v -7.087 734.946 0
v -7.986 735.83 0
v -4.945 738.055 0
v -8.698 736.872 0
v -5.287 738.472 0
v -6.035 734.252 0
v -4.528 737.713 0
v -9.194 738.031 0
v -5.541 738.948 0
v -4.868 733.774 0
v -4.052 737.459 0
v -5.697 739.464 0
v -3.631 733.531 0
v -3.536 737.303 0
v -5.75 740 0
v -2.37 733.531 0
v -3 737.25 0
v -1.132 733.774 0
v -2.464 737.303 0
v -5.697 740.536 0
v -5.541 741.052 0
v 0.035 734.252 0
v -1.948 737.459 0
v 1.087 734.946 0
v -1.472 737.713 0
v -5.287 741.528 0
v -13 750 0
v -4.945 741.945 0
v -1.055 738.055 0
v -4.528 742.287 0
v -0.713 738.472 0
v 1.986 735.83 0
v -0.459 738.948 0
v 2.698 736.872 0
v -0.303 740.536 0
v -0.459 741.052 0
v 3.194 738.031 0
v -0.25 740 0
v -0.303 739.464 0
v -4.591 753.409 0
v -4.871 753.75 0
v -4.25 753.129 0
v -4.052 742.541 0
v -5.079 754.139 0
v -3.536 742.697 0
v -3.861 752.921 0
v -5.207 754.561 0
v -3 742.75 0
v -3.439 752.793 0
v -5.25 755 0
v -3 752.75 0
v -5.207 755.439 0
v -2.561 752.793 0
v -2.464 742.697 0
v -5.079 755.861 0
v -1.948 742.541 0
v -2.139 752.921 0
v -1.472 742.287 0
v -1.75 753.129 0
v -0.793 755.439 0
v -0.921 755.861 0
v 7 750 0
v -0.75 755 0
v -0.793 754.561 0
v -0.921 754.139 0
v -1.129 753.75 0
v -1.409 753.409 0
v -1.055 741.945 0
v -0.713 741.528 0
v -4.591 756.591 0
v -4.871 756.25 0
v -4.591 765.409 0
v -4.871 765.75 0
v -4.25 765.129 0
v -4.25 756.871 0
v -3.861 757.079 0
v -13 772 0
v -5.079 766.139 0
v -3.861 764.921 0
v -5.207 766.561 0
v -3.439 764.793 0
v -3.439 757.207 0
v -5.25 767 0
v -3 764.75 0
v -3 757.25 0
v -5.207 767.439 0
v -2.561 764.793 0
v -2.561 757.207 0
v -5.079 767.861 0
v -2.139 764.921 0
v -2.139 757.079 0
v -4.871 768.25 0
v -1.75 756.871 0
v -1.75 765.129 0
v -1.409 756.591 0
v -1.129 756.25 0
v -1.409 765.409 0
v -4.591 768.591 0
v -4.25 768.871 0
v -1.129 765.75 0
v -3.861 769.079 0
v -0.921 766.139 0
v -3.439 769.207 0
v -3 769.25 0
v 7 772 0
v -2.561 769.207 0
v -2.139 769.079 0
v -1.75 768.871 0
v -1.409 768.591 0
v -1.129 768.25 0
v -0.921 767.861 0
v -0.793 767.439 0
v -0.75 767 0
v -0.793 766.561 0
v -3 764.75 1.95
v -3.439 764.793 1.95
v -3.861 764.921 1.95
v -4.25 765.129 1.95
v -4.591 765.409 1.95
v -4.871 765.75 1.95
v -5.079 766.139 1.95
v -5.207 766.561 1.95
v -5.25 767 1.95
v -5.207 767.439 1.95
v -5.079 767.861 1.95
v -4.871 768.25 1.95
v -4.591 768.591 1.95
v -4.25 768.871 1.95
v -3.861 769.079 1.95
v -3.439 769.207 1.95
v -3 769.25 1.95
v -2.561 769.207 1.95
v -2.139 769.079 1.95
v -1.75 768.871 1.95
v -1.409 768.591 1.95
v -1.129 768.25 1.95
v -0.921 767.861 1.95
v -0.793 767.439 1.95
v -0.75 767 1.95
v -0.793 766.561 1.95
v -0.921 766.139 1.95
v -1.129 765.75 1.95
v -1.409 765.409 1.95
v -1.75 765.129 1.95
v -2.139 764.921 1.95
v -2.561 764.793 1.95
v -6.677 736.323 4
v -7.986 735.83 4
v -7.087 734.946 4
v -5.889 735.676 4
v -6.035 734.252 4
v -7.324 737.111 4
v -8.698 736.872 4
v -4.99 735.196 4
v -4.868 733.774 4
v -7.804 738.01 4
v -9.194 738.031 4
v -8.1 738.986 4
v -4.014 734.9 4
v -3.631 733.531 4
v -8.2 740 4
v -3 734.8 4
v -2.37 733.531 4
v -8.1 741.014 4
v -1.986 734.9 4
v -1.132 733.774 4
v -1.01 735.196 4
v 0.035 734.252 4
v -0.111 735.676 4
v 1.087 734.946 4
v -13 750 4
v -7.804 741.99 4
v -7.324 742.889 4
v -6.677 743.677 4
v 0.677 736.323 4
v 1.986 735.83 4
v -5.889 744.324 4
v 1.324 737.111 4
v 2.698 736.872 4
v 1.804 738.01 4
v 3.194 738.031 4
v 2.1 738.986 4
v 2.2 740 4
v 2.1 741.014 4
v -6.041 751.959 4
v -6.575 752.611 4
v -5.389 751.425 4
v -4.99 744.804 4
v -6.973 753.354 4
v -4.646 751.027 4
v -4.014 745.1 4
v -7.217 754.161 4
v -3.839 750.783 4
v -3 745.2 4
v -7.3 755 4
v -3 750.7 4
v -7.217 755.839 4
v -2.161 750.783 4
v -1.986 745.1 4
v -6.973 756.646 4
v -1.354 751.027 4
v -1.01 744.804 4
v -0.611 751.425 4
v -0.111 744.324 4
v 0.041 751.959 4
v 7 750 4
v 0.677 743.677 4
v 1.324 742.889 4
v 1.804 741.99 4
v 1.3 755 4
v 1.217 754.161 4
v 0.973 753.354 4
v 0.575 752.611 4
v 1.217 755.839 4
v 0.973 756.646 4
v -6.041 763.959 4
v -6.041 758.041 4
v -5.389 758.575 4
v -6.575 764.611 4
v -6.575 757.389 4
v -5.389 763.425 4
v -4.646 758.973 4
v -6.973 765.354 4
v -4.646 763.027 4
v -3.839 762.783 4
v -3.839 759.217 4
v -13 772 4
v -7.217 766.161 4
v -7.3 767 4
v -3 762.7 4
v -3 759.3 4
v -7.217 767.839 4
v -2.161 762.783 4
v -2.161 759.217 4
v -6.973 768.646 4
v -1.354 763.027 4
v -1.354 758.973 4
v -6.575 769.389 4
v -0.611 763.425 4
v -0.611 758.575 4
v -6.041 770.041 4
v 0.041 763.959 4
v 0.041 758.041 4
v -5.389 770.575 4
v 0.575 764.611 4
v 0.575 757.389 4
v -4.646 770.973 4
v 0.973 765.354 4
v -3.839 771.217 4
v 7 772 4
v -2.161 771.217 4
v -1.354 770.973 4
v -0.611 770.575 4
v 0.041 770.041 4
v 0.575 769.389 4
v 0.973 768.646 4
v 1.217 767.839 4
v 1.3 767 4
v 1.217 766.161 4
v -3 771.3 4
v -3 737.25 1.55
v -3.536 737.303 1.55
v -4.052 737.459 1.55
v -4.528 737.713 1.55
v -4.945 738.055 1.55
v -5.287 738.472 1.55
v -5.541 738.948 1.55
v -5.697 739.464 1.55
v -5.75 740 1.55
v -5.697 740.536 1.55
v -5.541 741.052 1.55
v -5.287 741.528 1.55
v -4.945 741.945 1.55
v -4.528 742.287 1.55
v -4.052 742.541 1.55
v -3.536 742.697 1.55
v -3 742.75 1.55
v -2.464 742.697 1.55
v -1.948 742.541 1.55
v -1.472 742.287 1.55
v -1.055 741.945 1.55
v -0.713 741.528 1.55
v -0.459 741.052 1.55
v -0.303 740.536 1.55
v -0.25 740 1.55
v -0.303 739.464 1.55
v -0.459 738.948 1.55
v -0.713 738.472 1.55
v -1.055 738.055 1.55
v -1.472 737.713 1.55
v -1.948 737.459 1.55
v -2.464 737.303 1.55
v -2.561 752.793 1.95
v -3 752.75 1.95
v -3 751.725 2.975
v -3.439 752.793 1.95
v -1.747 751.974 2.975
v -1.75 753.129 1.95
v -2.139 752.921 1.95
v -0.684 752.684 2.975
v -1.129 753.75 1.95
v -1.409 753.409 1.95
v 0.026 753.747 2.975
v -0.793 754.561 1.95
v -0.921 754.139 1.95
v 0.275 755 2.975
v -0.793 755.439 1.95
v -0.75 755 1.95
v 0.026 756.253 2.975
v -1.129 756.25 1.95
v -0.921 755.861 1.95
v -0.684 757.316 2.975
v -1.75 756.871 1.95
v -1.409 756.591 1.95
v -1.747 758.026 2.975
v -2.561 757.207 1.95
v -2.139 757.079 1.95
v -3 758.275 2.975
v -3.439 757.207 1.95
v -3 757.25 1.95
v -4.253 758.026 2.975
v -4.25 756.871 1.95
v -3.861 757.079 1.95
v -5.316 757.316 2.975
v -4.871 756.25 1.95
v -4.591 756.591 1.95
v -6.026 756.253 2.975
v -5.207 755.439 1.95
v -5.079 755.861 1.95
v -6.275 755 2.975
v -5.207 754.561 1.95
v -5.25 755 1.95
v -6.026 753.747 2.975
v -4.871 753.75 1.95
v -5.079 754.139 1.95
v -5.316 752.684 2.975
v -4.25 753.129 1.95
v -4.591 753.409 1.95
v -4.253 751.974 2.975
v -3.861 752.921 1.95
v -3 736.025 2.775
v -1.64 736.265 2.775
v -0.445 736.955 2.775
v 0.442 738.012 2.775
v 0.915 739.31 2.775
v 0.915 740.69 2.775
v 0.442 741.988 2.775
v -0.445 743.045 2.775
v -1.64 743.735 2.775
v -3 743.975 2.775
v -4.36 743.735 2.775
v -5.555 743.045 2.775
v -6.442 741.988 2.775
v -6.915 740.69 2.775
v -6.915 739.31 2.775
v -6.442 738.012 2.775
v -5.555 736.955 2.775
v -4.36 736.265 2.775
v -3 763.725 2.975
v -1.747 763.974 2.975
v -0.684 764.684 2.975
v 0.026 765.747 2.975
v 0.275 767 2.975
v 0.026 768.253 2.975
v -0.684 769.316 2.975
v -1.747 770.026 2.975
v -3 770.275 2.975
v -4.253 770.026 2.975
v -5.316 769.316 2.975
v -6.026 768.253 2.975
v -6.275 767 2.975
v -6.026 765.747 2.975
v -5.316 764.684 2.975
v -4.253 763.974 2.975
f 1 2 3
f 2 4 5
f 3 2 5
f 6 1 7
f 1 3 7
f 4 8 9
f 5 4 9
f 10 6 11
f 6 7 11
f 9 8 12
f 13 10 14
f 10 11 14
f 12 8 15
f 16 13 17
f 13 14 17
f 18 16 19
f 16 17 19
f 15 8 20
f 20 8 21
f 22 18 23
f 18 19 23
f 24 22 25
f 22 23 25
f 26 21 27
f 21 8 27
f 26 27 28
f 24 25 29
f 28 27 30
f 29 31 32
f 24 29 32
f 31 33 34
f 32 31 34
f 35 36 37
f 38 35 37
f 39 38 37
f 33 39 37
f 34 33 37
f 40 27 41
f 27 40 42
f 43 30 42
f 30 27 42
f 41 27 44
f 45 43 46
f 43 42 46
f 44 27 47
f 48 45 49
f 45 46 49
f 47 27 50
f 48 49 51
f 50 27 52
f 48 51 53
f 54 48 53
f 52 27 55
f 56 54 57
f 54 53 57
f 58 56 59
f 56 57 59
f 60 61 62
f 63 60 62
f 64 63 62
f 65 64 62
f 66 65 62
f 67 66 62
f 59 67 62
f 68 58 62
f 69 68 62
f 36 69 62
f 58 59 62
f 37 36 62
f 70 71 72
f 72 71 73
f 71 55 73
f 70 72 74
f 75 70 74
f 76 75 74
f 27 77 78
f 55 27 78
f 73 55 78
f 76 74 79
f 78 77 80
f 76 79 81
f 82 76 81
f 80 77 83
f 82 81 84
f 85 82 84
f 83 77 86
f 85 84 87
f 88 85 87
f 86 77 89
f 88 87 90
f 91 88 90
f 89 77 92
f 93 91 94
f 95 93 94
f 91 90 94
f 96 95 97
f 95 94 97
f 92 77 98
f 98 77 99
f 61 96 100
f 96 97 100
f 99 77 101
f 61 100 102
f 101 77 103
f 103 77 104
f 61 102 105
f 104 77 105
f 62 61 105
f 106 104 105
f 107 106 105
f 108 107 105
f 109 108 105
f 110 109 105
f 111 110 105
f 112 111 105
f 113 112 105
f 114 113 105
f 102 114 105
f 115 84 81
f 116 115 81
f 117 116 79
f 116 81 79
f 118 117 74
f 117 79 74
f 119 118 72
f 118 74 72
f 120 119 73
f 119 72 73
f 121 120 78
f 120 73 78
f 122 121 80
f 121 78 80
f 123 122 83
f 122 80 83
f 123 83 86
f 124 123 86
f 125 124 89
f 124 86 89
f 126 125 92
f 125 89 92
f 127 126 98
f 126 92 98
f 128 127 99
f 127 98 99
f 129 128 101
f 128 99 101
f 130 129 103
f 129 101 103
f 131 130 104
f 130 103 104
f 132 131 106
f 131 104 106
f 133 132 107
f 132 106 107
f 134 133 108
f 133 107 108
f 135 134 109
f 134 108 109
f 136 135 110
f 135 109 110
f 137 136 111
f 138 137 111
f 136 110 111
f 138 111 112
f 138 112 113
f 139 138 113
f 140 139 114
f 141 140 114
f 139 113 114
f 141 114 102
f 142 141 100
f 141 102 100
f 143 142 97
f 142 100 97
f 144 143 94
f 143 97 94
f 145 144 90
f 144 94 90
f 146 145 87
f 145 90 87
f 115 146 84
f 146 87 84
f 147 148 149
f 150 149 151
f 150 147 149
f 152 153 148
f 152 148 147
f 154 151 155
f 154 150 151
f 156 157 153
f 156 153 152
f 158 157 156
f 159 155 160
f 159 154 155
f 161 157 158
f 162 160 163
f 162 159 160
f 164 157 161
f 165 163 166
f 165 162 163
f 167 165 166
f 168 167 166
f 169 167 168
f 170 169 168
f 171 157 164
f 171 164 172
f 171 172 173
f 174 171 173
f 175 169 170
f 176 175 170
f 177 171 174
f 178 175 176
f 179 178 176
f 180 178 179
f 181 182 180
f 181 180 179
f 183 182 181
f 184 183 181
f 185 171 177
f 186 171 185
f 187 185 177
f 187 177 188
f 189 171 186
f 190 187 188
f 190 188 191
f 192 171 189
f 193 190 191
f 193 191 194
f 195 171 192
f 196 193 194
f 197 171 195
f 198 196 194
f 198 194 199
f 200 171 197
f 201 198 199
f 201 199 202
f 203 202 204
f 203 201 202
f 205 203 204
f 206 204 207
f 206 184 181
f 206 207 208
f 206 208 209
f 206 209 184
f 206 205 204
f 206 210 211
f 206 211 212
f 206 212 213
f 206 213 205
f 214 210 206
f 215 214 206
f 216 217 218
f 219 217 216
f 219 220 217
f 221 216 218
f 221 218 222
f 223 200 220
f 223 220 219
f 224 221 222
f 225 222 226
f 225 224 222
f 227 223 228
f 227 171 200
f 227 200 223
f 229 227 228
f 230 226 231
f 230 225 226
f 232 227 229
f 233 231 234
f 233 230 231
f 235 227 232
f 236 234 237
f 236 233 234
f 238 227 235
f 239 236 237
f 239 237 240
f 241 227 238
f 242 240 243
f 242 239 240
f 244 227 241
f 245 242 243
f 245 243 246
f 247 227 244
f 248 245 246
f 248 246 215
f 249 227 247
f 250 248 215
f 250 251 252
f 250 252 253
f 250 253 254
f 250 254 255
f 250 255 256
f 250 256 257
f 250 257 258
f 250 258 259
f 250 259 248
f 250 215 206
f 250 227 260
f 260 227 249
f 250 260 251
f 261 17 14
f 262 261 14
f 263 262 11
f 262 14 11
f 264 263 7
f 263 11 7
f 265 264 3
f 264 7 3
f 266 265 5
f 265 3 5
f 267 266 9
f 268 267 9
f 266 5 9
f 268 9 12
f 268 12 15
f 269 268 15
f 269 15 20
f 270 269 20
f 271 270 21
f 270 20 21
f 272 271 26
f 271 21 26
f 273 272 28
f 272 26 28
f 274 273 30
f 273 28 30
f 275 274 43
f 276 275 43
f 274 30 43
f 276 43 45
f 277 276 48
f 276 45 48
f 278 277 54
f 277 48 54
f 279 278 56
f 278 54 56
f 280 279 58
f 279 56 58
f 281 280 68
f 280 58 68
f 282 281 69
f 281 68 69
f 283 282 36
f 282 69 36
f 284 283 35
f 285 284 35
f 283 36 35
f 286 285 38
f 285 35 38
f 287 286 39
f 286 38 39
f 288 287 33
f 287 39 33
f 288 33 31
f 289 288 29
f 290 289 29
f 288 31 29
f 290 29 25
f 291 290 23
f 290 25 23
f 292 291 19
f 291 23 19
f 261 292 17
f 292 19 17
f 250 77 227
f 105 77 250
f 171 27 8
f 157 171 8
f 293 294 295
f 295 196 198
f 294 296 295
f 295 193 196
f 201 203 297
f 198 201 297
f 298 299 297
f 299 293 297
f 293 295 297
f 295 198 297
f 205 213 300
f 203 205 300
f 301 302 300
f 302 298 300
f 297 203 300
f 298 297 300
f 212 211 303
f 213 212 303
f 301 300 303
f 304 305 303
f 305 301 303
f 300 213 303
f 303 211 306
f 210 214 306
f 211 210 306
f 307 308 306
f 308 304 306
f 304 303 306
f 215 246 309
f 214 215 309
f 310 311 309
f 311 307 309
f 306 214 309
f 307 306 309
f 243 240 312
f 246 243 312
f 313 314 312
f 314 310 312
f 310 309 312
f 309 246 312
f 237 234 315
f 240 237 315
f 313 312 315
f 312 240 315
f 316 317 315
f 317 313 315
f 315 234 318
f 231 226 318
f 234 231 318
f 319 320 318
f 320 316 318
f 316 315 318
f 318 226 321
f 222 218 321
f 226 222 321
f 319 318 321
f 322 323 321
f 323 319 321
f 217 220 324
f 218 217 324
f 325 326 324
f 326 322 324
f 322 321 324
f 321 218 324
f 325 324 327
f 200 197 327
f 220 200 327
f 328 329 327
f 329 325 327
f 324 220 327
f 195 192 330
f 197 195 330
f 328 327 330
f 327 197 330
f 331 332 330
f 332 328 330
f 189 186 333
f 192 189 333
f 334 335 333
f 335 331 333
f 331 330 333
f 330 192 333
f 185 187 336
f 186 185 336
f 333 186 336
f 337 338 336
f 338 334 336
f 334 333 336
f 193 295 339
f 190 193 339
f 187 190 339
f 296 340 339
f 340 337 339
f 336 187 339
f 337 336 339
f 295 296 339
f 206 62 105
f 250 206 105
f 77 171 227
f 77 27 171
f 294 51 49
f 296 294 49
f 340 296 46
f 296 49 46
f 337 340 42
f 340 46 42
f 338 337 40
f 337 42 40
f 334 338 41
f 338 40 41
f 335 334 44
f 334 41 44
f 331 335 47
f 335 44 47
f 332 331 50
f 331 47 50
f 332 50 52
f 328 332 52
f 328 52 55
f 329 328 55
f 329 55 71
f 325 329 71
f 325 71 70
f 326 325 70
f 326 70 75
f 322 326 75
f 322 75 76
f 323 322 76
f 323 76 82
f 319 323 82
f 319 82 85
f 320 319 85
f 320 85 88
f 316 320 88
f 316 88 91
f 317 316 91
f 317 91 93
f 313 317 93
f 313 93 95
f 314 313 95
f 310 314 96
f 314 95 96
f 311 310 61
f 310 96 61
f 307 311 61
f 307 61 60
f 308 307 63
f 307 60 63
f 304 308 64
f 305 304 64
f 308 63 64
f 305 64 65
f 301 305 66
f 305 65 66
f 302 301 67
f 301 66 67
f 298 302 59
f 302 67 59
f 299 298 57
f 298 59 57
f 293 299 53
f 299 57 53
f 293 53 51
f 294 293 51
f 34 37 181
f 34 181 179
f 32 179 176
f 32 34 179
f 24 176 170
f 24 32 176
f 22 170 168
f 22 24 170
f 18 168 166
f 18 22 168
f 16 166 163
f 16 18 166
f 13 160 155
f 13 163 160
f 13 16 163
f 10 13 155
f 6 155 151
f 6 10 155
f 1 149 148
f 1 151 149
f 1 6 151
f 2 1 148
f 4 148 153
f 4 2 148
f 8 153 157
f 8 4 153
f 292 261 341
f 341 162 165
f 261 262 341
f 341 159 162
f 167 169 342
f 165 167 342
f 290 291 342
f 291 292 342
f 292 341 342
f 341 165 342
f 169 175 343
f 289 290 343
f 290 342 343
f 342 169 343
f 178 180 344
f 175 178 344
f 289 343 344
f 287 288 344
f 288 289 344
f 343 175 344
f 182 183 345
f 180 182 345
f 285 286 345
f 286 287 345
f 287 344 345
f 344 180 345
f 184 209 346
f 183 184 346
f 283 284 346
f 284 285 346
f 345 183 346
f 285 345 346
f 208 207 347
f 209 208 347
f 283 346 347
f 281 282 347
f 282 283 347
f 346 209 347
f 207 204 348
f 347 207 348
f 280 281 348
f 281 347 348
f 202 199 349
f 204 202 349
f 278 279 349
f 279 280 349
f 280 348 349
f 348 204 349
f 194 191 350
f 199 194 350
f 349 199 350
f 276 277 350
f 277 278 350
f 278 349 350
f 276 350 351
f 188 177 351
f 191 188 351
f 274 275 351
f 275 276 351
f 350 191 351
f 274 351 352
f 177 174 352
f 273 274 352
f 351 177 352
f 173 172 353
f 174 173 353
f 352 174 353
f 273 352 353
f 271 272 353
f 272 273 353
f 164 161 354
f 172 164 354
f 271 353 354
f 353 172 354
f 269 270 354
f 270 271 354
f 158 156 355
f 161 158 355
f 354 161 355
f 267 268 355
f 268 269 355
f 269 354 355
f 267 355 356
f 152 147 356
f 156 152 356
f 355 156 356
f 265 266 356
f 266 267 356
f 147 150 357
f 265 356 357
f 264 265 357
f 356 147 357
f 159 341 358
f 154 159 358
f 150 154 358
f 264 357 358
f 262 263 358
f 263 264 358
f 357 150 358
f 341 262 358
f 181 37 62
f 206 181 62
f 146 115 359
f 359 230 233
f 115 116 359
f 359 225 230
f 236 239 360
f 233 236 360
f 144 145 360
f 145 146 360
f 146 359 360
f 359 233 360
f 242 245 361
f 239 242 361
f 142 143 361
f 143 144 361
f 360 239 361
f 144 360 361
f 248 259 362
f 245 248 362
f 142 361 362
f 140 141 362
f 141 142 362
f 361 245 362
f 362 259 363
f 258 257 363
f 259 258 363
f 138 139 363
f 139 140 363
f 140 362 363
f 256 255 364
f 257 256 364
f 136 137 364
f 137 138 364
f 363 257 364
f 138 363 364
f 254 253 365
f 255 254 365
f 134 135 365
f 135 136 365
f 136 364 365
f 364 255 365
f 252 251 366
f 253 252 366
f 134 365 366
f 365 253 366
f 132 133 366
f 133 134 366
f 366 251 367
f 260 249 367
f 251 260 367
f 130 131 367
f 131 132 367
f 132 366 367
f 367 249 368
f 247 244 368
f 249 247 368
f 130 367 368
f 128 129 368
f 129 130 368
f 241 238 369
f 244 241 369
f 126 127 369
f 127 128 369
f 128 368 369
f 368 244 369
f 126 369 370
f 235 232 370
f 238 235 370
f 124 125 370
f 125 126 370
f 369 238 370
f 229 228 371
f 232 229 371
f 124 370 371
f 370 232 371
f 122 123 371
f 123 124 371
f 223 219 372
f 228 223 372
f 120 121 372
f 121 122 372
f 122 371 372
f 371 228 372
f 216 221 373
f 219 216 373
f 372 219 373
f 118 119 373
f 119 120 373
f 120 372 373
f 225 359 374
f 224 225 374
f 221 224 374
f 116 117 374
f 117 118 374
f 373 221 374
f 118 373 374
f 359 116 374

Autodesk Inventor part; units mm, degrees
ref_plane "YZ Plane" through (0, 0, 0) normal (1, 0, 0) x (0, 1, 0)
ref_plane "XZ Plane" through (0, 0, 0) normal (0, 1, 0) x (-1, 0, 0)
ref_plane "XY Plane" through (0, 0, 0) normal (0, 0, 1) x (1, 0, 0)
ref_plane "Work Plane1" through (18.544, -14.9845, 0) normal (0, 0, 1) x (1, 0, 0)
sketch "Sketch1" plane through (18.544, -14.9845, 0) normal (0, 0, 1) x (1, 0, 0)
  line L0 (-31.544, 764.9845) -> (-24.544, 764.9845) projected
  line L1 (-24.544, 764.9845) -> (-24.544, 1014.9845) projected
  line L2 (-31.544, 1014.9845) -> (-24.544, 1014.9845) projected
  line L3 (-31.544, 764.9845) -> (-31.544, 1014.9845) projected
  line L4 (-18.544, 764.9845) -> (-11.544, 764.9845) projected
  line L5 (-11.544, 764.9845) -> (-11.544, 1014.9845) projected
  line L6 (-18.544, 1014.9845) -> (-11.544, 1014.9845) projected
  line L7 (-18.544, 764.9845) -> (-18.544, 1014.9845) projected
  circle A0 centre (-21.544, 754.9845) radius 2.5 projected
  line L8 (-21.544, 754.9845) -> (-21.544, 786.7892) construction
  line L9 (-31.544, 764.9845) -> (-27.7385, 753.0151)
  line L10 (-15.3496, 753.0151) -> (-11.544, 764.9845)
  circle A1 centre (-21.544, 754.9845) radius 6.5
  line L11 (-31.544, 764.9845) -> (-31.544, 786.9845)
  line L12 (-31.544, 786.9845) -> (-11.544, 786.9845)
  line L13 (-11.544, 764.9845) -> (-11.544, 786.9845)
  point P0 (-18.544, 14.9845)
  point P1 (-21.544, 769.9845)
  point P2 (-21.544, 781.9845)
  dimension "d0" = 5
  dimension "d1" = 12
  dimension "d2" = 4
  dimension "d3" = 5
extrude "Extrusion1" add sketch "Sketch1" along normal blind 4 contours L3 L12 L1 L0 | L0 L1 L12 L7 L4 L10 A1 L9 | A1 | L12 L5 L4 L7 | A0
sketch "Sketch2" plane through (18.544, -14.9845, 4) normal (0, 0, 1) x (1, 0, 0)
  point P0 (-18.544, 14.9845)
  point P1 (-21.544, 769.9845)
  point P2 (-21.544, 781.9845)
  point P3 (-21.544, 754.9845)
hole "Hole1" at (-3, 755, 4) at (-3, 767, 4) direction (0, 0, -1) diameter 4.5 end through all countersink diameter 8.6 countersink angle 90 clearance for "Countersunk Head GOST 12876-67" size "M4" standard "GOST"
hole "Hole2" at (-3, 740, 4) direction (0, 0, -1) diameter 5.5 end through all countersink diameter 10.4 countersink angle 90 clearance for "Countersunk Head GOST 12876-67" size "M5" standard "GOST"
properties part number "belt_tentioner_plane"
